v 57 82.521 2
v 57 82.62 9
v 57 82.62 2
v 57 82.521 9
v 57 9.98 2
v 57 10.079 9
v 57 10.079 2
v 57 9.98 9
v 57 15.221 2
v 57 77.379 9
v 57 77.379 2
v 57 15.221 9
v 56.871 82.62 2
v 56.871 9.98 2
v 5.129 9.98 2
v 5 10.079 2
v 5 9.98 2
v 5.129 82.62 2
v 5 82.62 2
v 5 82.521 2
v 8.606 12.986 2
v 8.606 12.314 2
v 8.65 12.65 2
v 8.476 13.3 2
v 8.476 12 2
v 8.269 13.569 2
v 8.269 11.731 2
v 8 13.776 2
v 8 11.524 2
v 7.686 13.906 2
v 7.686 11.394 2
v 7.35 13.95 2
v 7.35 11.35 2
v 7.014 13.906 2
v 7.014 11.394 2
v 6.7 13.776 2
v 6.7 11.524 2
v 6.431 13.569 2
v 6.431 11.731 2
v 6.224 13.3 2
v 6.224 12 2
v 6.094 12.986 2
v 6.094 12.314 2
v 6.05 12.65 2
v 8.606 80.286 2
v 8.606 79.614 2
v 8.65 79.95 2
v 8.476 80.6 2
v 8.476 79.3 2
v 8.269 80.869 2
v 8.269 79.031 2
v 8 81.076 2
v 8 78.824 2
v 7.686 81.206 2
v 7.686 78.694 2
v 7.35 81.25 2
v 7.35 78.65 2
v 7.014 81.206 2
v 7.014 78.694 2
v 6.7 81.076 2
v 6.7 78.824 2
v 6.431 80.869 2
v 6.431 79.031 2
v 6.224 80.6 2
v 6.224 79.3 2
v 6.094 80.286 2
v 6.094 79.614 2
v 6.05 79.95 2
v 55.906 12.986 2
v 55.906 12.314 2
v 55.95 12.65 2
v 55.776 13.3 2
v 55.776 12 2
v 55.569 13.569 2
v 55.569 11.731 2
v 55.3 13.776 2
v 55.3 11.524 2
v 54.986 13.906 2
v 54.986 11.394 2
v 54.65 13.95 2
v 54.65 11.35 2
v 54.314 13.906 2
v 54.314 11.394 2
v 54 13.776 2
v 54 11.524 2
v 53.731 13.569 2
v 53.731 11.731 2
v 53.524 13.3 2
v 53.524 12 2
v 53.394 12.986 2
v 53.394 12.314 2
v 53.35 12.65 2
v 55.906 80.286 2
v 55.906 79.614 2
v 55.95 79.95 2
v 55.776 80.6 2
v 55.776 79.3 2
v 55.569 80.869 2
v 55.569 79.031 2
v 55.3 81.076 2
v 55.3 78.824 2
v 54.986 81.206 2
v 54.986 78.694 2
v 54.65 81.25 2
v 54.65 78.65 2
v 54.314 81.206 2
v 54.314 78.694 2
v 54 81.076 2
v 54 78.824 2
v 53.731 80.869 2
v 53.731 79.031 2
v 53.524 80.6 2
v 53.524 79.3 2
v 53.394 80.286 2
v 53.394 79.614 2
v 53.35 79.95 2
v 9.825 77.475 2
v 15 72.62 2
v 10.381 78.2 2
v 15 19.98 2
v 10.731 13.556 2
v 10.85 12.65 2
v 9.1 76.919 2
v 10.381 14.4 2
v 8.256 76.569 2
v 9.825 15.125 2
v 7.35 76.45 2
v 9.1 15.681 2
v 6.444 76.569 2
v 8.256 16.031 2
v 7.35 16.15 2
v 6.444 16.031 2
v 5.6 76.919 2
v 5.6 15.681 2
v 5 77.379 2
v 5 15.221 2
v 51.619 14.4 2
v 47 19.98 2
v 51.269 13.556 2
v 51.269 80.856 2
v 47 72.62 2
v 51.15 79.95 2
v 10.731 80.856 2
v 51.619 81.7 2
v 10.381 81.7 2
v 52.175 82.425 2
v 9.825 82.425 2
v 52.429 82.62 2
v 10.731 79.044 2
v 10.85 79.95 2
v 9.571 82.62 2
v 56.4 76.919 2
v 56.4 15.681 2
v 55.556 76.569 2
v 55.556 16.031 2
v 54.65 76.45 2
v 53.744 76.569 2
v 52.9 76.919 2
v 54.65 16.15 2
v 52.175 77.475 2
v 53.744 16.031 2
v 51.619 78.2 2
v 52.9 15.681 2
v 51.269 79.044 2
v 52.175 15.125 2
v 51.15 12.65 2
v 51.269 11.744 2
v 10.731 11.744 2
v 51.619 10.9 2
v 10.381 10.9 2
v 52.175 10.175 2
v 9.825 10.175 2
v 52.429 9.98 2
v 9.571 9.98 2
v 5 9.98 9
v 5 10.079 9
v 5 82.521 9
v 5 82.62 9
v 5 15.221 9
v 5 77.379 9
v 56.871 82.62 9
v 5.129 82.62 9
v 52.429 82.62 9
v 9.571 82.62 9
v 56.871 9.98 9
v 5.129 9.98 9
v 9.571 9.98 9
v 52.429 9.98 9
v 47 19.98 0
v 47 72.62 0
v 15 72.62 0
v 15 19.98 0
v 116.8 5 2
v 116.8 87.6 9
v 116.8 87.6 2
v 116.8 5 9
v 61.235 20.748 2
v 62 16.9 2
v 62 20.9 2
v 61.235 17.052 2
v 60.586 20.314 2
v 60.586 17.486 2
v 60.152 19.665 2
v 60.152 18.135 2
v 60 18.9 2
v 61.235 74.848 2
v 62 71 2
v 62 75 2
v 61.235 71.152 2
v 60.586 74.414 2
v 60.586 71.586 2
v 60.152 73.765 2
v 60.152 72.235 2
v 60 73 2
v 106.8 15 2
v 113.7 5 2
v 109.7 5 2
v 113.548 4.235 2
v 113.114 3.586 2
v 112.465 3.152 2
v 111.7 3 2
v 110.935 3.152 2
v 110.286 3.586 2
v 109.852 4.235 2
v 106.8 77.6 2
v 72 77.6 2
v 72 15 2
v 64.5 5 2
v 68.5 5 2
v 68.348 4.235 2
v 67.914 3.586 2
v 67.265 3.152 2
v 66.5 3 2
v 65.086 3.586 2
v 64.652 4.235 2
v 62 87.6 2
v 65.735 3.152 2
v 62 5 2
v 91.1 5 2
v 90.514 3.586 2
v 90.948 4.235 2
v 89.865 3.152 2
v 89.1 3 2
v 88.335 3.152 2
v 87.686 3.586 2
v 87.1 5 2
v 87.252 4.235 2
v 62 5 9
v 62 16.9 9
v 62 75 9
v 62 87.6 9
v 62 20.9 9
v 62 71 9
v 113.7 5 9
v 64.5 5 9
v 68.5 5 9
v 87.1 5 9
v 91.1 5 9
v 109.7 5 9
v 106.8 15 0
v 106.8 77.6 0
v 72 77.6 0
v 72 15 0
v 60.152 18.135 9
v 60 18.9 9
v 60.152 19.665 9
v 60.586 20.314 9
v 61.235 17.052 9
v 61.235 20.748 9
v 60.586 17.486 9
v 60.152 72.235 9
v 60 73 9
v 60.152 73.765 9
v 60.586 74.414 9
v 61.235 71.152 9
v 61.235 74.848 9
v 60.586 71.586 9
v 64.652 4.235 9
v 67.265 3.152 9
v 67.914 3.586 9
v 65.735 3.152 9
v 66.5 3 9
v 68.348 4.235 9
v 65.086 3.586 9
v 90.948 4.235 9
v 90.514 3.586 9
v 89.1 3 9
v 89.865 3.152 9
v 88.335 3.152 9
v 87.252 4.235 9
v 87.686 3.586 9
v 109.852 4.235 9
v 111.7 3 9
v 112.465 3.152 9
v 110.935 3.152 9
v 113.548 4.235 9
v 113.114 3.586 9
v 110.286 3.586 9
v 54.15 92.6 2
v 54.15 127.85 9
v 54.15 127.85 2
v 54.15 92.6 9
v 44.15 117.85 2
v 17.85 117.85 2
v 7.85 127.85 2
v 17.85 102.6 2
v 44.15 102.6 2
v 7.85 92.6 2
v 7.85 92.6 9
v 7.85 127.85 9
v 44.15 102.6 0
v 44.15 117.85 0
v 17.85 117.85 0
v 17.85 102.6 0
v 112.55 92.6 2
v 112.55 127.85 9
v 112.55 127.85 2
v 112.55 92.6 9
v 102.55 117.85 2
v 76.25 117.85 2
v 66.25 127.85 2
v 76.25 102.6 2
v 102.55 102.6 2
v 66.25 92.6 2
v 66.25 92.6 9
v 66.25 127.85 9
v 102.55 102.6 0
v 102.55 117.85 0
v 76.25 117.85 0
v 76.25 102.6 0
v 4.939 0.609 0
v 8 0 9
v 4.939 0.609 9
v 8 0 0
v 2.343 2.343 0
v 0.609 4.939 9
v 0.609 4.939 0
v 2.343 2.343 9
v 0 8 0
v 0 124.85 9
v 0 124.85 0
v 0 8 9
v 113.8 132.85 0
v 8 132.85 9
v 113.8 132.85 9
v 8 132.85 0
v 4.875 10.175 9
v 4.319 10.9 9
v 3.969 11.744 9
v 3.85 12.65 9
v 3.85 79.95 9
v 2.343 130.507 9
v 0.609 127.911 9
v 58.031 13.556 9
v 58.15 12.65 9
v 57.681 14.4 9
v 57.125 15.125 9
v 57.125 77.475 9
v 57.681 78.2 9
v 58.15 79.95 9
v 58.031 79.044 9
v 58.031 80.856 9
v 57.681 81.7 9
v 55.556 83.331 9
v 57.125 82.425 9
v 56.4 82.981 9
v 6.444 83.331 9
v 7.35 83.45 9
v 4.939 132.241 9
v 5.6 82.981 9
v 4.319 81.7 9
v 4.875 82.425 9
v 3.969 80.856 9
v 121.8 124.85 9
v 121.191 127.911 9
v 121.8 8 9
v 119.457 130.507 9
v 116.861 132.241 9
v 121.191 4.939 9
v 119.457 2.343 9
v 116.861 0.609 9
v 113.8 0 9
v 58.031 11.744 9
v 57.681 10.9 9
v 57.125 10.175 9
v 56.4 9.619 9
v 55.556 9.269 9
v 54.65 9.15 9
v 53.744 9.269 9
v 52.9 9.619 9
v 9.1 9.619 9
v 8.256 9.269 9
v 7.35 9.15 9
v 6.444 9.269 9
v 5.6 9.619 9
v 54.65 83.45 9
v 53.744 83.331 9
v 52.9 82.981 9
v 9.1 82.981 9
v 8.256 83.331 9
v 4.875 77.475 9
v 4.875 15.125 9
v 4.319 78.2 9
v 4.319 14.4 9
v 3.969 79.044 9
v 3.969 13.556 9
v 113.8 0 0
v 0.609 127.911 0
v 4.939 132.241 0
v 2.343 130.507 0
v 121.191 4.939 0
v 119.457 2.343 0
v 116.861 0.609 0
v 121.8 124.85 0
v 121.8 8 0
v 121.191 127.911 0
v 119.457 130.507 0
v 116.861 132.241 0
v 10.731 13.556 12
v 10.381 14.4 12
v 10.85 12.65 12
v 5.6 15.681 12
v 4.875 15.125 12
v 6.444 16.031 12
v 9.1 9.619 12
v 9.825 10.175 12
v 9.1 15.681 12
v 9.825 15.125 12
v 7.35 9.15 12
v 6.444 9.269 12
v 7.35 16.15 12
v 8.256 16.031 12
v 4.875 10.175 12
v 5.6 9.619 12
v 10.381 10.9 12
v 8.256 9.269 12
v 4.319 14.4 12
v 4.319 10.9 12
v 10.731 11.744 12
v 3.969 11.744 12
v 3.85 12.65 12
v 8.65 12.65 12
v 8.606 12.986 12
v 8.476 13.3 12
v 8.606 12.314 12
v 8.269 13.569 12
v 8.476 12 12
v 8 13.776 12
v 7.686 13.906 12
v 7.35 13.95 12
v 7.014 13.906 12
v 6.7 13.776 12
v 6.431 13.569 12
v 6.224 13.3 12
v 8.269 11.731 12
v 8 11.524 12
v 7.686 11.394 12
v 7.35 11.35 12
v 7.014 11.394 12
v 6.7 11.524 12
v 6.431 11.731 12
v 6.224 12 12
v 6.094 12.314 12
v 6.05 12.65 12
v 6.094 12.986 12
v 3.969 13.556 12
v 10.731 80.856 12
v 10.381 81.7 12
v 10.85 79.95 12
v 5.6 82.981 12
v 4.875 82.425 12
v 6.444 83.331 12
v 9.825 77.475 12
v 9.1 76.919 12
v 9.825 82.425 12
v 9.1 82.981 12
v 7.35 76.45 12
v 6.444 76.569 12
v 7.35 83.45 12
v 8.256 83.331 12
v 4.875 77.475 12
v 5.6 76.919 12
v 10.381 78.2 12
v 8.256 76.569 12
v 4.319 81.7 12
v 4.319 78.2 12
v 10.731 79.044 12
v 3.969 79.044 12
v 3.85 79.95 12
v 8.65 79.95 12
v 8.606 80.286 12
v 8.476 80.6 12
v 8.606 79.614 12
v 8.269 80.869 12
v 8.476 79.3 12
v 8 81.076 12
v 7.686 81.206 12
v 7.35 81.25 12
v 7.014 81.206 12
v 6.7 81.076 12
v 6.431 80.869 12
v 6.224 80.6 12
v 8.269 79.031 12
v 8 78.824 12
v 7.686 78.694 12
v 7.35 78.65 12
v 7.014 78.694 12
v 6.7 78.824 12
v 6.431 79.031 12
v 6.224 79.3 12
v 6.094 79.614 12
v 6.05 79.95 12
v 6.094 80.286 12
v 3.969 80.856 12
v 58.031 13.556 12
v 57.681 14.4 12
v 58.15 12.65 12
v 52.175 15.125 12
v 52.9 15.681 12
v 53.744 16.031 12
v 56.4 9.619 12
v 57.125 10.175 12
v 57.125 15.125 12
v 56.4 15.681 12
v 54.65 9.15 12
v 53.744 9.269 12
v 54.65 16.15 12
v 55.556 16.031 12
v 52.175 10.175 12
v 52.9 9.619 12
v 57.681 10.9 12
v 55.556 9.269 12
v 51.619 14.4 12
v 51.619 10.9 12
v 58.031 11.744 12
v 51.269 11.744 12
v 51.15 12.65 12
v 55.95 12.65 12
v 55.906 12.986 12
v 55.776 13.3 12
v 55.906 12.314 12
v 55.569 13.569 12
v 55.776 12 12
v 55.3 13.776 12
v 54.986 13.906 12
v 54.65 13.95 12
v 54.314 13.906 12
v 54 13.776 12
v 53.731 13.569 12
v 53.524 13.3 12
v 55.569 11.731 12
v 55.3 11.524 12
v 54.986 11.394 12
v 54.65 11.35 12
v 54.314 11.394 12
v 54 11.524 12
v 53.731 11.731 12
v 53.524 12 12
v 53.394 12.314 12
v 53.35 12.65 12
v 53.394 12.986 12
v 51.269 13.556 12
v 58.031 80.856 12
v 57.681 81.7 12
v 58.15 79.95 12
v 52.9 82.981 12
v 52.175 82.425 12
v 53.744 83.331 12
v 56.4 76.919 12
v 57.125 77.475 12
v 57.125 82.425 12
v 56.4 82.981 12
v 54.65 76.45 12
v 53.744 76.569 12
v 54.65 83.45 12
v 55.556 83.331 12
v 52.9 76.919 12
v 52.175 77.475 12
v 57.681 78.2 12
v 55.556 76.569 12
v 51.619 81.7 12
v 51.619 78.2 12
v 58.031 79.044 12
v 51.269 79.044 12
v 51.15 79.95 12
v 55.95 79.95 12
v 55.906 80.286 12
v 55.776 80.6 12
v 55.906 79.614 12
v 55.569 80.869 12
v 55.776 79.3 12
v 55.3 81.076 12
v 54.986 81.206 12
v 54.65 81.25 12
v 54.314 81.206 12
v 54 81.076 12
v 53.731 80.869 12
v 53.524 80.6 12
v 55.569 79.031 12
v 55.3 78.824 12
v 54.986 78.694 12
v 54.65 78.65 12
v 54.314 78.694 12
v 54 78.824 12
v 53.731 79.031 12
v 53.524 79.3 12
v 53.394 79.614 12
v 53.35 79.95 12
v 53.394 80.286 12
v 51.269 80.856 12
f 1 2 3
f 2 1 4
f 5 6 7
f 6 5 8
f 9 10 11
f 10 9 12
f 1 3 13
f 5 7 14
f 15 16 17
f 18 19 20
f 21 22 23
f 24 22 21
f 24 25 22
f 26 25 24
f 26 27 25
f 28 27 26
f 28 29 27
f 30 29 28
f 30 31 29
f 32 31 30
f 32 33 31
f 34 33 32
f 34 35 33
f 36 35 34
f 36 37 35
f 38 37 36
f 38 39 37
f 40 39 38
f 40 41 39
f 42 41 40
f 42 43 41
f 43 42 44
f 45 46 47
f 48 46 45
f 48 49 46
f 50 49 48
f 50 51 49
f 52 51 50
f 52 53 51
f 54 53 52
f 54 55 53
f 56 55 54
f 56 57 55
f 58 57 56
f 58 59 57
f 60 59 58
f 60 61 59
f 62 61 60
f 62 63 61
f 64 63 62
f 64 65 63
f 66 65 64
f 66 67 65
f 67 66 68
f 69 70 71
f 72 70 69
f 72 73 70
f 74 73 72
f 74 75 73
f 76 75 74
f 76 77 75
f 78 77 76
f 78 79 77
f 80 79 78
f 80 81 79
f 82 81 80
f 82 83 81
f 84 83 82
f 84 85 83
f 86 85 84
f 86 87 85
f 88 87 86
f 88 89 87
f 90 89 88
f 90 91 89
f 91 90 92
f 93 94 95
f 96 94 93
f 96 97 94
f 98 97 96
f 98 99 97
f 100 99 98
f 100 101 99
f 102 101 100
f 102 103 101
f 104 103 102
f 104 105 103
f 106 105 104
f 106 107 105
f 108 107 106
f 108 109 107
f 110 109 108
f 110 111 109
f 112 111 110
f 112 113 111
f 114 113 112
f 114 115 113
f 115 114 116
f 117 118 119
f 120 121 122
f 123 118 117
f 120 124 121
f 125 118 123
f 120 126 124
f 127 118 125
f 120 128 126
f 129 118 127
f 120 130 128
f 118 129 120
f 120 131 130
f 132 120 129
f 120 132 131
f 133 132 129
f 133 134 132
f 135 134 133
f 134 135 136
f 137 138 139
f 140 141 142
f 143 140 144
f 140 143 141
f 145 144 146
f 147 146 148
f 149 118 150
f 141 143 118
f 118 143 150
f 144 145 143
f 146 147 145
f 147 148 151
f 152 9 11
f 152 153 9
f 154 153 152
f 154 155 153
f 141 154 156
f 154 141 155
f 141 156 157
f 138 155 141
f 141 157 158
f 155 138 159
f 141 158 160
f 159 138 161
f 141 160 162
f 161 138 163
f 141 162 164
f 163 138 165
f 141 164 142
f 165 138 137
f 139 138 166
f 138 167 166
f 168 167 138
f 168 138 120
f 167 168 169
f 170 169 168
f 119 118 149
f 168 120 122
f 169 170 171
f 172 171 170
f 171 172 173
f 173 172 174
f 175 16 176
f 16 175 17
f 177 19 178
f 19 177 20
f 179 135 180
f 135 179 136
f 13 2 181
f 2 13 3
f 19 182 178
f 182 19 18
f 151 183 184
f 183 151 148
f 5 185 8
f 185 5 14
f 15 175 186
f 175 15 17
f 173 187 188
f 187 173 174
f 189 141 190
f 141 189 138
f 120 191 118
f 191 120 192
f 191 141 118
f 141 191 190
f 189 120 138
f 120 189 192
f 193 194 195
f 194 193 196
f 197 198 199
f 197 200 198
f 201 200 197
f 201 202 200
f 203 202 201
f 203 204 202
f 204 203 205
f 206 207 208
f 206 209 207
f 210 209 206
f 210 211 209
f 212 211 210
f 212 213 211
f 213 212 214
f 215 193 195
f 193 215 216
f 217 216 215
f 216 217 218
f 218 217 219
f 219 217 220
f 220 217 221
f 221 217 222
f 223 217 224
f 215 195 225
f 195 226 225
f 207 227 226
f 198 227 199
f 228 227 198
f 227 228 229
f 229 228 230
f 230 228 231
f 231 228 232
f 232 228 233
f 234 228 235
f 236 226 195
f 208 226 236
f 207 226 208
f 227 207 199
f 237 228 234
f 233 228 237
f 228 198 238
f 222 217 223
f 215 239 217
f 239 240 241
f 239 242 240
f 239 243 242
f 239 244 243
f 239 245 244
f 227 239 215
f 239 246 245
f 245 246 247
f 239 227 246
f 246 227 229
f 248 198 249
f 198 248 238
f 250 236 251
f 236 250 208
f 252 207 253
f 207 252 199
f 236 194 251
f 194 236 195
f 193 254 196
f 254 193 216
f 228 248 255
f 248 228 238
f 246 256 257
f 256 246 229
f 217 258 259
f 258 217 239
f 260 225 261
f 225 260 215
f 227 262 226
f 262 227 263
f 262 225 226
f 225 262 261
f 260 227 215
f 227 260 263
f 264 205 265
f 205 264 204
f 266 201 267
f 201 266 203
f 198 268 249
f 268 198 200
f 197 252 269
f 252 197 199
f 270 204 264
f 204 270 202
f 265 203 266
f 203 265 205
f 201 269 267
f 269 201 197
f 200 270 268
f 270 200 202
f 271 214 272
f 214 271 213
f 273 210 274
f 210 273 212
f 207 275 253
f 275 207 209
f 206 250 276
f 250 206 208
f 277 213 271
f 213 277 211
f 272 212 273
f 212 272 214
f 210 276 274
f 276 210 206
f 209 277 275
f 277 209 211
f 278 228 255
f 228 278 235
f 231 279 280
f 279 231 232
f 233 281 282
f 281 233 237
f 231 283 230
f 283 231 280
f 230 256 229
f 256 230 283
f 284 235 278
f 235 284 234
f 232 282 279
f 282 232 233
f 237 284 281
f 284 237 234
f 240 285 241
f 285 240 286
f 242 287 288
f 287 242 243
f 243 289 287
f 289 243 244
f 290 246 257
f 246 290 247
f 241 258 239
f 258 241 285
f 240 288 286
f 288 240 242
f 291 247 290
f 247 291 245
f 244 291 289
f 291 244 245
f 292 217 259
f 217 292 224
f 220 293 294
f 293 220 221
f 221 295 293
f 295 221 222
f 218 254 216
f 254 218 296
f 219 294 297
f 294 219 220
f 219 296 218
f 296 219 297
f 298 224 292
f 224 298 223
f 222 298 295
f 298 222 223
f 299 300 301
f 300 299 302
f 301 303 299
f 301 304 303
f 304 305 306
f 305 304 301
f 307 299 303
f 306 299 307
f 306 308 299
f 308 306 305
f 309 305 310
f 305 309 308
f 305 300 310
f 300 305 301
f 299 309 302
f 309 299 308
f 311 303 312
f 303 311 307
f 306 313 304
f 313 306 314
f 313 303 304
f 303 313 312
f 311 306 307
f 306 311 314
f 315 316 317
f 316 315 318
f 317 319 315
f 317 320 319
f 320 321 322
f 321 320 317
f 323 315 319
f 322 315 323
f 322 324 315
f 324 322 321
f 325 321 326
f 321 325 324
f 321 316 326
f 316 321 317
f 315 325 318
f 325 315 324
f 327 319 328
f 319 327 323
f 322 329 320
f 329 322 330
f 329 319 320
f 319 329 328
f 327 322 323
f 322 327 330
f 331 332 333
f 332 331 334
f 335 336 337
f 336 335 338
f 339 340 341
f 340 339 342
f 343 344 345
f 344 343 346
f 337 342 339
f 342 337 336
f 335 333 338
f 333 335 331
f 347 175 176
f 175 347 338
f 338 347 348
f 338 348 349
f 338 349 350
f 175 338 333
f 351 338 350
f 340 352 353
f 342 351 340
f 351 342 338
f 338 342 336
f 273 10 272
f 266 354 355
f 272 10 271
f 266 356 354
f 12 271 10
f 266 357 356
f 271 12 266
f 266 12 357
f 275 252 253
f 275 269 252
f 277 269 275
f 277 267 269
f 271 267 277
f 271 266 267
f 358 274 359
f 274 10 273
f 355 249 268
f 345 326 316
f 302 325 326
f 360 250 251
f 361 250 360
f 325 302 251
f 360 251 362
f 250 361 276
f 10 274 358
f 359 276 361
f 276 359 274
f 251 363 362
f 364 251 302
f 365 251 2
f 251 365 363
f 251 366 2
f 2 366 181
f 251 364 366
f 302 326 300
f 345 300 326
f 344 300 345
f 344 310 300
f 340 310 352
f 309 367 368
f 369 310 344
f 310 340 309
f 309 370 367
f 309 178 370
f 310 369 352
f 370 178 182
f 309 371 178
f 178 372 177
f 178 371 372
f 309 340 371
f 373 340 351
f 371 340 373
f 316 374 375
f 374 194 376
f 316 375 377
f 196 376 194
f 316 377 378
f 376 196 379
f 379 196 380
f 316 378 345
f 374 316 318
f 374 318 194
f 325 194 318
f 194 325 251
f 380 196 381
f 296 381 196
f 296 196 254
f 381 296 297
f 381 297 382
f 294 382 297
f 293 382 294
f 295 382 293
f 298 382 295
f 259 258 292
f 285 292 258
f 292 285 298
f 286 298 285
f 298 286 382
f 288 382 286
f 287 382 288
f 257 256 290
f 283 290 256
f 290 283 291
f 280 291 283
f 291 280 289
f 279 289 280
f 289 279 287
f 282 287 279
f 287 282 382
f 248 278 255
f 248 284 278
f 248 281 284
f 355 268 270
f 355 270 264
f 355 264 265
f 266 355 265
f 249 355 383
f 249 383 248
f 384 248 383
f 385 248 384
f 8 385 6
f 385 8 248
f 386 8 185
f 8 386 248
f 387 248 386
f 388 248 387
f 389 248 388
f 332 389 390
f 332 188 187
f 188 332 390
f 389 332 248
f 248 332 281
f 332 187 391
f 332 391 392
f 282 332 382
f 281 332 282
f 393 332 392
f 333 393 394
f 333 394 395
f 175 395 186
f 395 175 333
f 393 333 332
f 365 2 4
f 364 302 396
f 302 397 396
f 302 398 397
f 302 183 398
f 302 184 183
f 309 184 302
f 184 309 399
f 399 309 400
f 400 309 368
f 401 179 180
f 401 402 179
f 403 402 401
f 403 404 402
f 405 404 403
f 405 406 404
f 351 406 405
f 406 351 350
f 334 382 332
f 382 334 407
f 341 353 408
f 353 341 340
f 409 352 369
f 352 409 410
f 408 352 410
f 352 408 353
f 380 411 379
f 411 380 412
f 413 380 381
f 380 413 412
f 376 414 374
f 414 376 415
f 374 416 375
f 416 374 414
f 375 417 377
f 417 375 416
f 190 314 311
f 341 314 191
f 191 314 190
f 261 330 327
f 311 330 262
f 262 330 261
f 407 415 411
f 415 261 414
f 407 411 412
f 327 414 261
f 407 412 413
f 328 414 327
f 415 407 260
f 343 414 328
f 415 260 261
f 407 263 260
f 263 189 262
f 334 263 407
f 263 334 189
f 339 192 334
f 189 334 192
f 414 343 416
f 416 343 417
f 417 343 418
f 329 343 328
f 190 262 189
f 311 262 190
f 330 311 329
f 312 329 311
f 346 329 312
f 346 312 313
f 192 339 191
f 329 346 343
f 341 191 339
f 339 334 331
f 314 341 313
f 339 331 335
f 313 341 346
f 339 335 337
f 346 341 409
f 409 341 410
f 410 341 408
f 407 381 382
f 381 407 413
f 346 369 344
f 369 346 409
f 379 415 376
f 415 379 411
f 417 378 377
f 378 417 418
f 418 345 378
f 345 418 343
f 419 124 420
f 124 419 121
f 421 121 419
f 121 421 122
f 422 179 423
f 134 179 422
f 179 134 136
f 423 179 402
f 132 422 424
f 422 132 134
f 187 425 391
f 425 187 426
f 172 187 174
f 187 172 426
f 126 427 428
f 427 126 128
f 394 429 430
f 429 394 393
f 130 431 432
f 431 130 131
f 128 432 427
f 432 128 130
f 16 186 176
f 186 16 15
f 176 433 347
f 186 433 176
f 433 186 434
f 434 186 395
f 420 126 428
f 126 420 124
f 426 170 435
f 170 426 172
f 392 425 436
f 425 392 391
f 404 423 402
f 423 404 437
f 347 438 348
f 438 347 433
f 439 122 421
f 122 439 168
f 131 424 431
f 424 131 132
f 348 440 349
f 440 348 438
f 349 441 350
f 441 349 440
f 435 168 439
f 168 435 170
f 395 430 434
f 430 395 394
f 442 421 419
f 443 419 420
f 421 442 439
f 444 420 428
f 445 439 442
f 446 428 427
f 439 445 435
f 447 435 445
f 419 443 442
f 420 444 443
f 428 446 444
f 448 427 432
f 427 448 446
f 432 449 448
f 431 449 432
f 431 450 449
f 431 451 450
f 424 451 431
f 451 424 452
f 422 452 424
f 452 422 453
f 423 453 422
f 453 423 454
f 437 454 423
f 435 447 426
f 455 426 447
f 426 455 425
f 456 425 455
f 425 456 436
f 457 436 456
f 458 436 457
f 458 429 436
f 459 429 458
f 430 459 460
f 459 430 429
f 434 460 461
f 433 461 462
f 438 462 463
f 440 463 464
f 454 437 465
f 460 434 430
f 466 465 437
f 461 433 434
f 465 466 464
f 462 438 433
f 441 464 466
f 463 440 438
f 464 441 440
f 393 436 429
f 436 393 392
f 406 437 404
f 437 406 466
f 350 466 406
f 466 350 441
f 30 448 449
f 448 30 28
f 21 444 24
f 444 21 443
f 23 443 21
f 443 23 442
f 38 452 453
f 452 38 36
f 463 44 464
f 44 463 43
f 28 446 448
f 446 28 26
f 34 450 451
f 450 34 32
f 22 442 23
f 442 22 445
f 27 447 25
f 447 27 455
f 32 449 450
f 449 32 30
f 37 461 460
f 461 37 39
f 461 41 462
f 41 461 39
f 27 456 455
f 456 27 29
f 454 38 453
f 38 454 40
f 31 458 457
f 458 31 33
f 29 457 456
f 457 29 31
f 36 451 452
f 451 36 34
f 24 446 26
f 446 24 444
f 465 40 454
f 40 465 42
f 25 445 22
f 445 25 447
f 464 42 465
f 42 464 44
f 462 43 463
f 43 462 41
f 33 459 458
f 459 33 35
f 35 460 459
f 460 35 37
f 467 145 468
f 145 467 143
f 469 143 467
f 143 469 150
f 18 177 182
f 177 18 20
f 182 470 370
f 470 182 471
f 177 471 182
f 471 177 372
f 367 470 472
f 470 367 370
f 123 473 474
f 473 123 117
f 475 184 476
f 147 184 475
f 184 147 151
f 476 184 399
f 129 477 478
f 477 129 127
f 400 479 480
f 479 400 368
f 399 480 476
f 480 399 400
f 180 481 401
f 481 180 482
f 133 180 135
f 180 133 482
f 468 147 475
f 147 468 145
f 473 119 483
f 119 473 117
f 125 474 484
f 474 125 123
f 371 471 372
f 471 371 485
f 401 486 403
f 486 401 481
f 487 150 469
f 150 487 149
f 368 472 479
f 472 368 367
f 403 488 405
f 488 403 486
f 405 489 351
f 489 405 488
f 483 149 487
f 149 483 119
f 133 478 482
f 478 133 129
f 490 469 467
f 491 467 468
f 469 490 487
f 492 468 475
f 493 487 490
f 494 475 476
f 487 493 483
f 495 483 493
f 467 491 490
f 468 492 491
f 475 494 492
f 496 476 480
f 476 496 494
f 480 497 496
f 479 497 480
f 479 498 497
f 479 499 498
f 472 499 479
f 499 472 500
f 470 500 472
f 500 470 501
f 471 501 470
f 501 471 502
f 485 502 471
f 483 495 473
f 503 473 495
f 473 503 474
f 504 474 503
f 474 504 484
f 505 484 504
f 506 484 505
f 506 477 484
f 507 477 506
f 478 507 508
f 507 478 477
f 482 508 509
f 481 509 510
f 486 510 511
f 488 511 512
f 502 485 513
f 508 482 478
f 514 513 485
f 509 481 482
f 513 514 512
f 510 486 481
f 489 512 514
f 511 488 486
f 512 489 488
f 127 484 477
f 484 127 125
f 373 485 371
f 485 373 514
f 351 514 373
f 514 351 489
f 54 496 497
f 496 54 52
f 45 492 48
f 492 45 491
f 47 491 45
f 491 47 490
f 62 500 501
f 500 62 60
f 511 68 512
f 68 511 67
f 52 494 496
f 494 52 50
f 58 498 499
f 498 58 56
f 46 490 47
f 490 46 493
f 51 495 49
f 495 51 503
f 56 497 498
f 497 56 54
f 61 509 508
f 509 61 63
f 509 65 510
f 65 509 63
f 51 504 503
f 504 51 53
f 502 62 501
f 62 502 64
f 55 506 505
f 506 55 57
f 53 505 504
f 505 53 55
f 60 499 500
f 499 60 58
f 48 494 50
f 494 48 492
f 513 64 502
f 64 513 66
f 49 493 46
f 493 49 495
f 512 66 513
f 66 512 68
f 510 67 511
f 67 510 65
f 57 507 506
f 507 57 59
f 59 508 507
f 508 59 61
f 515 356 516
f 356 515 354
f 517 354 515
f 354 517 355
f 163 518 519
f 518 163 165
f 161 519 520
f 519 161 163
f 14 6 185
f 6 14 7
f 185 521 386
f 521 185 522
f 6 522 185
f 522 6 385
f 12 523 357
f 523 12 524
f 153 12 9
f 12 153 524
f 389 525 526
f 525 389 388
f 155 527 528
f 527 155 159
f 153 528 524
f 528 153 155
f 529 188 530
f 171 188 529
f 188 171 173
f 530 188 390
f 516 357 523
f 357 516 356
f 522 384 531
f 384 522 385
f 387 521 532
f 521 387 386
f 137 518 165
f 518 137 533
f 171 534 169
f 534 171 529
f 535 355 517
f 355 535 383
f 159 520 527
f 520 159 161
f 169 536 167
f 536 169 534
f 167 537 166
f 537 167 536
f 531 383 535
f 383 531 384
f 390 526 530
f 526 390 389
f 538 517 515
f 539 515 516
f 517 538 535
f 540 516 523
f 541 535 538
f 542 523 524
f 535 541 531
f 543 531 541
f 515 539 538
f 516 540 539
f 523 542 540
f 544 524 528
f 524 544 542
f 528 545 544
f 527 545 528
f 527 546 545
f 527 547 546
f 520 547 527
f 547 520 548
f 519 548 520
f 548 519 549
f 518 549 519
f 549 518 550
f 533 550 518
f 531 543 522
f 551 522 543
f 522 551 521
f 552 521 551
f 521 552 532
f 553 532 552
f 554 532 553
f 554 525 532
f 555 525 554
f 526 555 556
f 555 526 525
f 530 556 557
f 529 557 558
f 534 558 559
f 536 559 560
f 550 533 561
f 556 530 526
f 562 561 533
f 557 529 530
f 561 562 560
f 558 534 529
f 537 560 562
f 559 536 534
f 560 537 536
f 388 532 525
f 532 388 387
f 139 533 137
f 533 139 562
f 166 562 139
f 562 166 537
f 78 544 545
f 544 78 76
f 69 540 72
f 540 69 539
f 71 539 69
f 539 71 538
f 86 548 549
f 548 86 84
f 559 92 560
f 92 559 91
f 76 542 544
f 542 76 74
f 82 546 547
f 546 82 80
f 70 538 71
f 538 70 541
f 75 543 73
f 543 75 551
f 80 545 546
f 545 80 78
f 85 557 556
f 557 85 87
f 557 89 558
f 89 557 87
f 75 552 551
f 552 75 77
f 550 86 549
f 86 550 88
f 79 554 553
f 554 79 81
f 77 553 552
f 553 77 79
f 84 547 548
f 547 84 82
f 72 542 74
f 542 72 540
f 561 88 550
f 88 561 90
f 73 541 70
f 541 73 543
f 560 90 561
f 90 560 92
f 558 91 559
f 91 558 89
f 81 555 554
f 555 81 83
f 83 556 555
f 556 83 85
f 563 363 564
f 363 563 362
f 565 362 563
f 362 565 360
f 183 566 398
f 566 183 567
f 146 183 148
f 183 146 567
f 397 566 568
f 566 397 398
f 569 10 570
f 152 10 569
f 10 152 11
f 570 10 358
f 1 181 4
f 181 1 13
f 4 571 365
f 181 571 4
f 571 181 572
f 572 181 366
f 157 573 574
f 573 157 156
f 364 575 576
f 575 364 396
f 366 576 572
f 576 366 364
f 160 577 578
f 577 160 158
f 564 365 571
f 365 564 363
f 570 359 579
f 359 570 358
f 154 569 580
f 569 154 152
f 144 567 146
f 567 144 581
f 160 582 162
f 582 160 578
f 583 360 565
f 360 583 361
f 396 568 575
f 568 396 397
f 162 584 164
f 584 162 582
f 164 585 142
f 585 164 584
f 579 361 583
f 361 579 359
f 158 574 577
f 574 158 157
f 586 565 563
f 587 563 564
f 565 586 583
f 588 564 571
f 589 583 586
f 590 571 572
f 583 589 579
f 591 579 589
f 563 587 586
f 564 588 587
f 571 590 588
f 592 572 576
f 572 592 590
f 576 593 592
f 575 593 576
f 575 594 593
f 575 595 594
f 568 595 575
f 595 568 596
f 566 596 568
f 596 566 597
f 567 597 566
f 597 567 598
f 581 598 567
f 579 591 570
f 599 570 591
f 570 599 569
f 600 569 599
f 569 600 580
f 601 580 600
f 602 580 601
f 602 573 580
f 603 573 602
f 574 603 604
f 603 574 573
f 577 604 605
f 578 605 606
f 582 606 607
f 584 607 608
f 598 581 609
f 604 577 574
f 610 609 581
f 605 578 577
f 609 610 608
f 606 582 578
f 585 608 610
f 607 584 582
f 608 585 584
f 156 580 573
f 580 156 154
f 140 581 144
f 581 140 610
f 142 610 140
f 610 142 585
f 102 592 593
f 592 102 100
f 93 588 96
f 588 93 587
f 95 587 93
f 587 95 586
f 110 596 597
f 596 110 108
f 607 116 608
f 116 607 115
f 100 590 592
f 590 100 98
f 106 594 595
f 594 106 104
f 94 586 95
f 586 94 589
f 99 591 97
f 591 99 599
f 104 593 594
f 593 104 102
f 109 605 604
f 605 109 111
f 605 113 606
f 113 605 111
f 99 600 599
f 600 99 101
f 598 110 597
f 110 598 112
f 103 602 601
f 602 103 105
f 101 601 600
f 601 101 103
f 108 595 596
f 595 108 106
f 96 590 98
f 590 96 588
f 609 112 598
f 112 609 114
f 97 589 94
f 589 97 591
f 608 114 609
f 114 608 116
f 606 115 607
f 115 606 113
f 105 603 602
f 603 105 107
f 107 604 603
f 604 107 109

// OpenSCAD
baseThickness = 2;
spacing = 5;
corner = 8;
undersideRimWidth = 10;
rimHeight = 7;

fpgaSizeX = 52;
fpgaSizeY = 72.64;
fpgaScrewSpacingX = 47.3;
fpgaScrewSpacingY = 67.3;


breadboardTolerance = 0.3;

smallBreadboardSizeX = 45.7;
smallBreadboardSizeY = 34.65;

bigBreadboardSizeX = 54.2;
bigBreadboardSizeY = 82;

bigBreadboardNubDiameter = 4;
bigBreadboardNubPositions = [ [0,13.9], [0,68], [4.5,0], [27.1,0], [49.7,0] ];

screwHoleSize = 2.6;
screwLength = 10;
screwPillarDiameter = 7;
fpgaHeightAboveBottom = 12;

module end_of_parameters_dummy() {}

//use <roundedsquare.scad>;
module roundedSquare(size=[10,10], radius=1, center=false, $fn=16) {
    size1 = (size+0==size) ? [size,size] : size;
    if (radius <= 0) {
        square(size1, center=center);
    }
    else {
        translate(center ? -size1/2 : [0,0])
        hull() {
            translate([radius,radius]) circle(r=radius);
            translate([size1[0]-radius,radius]) circle(r=radius);
            translate([size1[0]-radius,size1[1]-radius]) circle(r=radius);
            translate([radius,size1[1]-radius]) circle(r=radius);
        }
    }
}

module roundedOpenTopBox(size=[10,10,10], radius=2, wall=1, solid=false) {
    render(convexity=2)
    difference() {
        linear_extrude(height=size[2]) roundedSquare(size=[size[0],size[1]], radius=radius);
        if (!solid) {
            translate([0,0,wall])
            linear_extrude(height=size[2]-wall)
            translate([wall,wall]) roundedSquare(size=[size[0]-2*wall,size[1]-2*wall], radius=radius-wall);
        }
    }
}


module dummy() {}

nudge = 0.01;

smallBB = smallBreadboardSizeX > 0 && smallBreadboardSizeY > 0;

row1Height = max(fpgaSizeY, bigBreadboardSizeY+2*breadboardTolerance);
row2Height = smallBreadboardSizeY+2*breadboardTolerance;
col1Width = max(fpgaSizeX, smallBreadboardSizeX+2*breadboardTolerance);
col2Width = max(bigBreadboardSizeX+2*breadboardTolerance,smallBreadboardSizeX+2*breadboardTolerance);
width = col1Width+col2Width+3*spacing;
height = smallBB ? (row1Height+row2Height+3*spacing) : (row1Height+2*spacing);

col1X = spacing+0.5*col1Width;
col2X = 2*spacing+col1Width+0.5*col2Width;
row1Y = spacing+0.5*row1Height;
row2Y = row1Height+2*spacing+0.5*row2Height;

fpgaHoleXSize = fpgaSizeX-2*undersideRimWidth;
fpgaHoleYSize = fpgaSizeY-2*undersideRimWidth;

// cube centered in xy plane
module cCube(dimensions) {
    translate([-dimensions[0]/2,-dimensions[1]/2,0]) cube(dimensions);
}

module cutout(w,h) {
    translate([0,0,baseThickness]) cCube([w,h,rimHeight+nudge]);
    translate([0,0,-nudge]) cCube([w-2*undersideRimWidth,h-2*undersideRimWidth,baseThickness+2*nudge]);
}

module removers(x,y,width,height) {
    translate([x-width/2,y,baseThickness]) scale([0.9,1.25,1]) cylinder(d=spacing,h=rimHeight+nudge,$fn=36);
    translate([x+width/2,y,baseThickness]) scale([0.9,1.25,1])cylinder(d=spacing,h=rimHeight+nudge,$fn=36);
}

module screwPillar() {
    $fn = 24;
    render(convexity=2)
    difference() {
        cylinder(d=screwPillarDiameter,h=fpgaHeightAboveBottom);
        translate([0,0,fpgaHeightAboveBottom-screwLength])
        cylinder(d=screwHoleSize,h=screwLength+nudge);
    }
}

render(convexity=4)
difference() {
    linear_extrude(rimHeight+baseThickness) roundedSquare([width,height],radius=corner);
    translate([col1X,row1Y,0]) cutout(fpgaSizeX,fpgaSizeY);
    translate([col2X,row1Y,0]) cutout(bigBreadboardSizeX+2*breadboardTolerance,bigBreadboardSizeY+2*breadboardTolerance);
//    removers(col2X,row1Y,bigBreadboardSizeX+2*breadboardTolerance,bigBreadboardSizeY+2*breadboardTolerance);
    for (xy=bigBreadboardNubPositions)
        translate([col2X-(bigBreadboardSizeX+2*breadboardTolerance)/2+xy[0],row1Y-(bigBreadboardSizeY+2*breadboardTolerance)/2+xy[1],baseThickness]) cylinder(d=bigBreadboardNubDiameter,h=rimHeight+nudge,$fn=16);
    if (smallBB) {
 //       removers(col1X,row2Y,smallBreadboardSizeX+2*breadboardTolerance,smallBreadboardSizeY+2*breadboardTolerance);
//        removers(col2X,row2Y,smallBreadboardSizeX+2*breadboardTolerance,smallBreadboardSizeY+2*breadboardTolerance);
        translate([col1X,row2Y,0]) cutout(smallBreadboardSizeX+2*breadboardTolerance,smallBreadboardSizeY+2*breadboardTolerance);
        translate([col2X,row2Y,0]) cutout(smallBreadboardSizeX+2*breadboardTolerance,smallBreadboardSizeY+2*breadboardTolerance);
    }
}

for (i=[-1:2:1]) for(j=[-1:2:1])
    translate([col1X+i*0.5*fpgaScrewSpacingX,row1Y+j*0.5*fpgaScrewSpacingY,0]) screwPillar();
